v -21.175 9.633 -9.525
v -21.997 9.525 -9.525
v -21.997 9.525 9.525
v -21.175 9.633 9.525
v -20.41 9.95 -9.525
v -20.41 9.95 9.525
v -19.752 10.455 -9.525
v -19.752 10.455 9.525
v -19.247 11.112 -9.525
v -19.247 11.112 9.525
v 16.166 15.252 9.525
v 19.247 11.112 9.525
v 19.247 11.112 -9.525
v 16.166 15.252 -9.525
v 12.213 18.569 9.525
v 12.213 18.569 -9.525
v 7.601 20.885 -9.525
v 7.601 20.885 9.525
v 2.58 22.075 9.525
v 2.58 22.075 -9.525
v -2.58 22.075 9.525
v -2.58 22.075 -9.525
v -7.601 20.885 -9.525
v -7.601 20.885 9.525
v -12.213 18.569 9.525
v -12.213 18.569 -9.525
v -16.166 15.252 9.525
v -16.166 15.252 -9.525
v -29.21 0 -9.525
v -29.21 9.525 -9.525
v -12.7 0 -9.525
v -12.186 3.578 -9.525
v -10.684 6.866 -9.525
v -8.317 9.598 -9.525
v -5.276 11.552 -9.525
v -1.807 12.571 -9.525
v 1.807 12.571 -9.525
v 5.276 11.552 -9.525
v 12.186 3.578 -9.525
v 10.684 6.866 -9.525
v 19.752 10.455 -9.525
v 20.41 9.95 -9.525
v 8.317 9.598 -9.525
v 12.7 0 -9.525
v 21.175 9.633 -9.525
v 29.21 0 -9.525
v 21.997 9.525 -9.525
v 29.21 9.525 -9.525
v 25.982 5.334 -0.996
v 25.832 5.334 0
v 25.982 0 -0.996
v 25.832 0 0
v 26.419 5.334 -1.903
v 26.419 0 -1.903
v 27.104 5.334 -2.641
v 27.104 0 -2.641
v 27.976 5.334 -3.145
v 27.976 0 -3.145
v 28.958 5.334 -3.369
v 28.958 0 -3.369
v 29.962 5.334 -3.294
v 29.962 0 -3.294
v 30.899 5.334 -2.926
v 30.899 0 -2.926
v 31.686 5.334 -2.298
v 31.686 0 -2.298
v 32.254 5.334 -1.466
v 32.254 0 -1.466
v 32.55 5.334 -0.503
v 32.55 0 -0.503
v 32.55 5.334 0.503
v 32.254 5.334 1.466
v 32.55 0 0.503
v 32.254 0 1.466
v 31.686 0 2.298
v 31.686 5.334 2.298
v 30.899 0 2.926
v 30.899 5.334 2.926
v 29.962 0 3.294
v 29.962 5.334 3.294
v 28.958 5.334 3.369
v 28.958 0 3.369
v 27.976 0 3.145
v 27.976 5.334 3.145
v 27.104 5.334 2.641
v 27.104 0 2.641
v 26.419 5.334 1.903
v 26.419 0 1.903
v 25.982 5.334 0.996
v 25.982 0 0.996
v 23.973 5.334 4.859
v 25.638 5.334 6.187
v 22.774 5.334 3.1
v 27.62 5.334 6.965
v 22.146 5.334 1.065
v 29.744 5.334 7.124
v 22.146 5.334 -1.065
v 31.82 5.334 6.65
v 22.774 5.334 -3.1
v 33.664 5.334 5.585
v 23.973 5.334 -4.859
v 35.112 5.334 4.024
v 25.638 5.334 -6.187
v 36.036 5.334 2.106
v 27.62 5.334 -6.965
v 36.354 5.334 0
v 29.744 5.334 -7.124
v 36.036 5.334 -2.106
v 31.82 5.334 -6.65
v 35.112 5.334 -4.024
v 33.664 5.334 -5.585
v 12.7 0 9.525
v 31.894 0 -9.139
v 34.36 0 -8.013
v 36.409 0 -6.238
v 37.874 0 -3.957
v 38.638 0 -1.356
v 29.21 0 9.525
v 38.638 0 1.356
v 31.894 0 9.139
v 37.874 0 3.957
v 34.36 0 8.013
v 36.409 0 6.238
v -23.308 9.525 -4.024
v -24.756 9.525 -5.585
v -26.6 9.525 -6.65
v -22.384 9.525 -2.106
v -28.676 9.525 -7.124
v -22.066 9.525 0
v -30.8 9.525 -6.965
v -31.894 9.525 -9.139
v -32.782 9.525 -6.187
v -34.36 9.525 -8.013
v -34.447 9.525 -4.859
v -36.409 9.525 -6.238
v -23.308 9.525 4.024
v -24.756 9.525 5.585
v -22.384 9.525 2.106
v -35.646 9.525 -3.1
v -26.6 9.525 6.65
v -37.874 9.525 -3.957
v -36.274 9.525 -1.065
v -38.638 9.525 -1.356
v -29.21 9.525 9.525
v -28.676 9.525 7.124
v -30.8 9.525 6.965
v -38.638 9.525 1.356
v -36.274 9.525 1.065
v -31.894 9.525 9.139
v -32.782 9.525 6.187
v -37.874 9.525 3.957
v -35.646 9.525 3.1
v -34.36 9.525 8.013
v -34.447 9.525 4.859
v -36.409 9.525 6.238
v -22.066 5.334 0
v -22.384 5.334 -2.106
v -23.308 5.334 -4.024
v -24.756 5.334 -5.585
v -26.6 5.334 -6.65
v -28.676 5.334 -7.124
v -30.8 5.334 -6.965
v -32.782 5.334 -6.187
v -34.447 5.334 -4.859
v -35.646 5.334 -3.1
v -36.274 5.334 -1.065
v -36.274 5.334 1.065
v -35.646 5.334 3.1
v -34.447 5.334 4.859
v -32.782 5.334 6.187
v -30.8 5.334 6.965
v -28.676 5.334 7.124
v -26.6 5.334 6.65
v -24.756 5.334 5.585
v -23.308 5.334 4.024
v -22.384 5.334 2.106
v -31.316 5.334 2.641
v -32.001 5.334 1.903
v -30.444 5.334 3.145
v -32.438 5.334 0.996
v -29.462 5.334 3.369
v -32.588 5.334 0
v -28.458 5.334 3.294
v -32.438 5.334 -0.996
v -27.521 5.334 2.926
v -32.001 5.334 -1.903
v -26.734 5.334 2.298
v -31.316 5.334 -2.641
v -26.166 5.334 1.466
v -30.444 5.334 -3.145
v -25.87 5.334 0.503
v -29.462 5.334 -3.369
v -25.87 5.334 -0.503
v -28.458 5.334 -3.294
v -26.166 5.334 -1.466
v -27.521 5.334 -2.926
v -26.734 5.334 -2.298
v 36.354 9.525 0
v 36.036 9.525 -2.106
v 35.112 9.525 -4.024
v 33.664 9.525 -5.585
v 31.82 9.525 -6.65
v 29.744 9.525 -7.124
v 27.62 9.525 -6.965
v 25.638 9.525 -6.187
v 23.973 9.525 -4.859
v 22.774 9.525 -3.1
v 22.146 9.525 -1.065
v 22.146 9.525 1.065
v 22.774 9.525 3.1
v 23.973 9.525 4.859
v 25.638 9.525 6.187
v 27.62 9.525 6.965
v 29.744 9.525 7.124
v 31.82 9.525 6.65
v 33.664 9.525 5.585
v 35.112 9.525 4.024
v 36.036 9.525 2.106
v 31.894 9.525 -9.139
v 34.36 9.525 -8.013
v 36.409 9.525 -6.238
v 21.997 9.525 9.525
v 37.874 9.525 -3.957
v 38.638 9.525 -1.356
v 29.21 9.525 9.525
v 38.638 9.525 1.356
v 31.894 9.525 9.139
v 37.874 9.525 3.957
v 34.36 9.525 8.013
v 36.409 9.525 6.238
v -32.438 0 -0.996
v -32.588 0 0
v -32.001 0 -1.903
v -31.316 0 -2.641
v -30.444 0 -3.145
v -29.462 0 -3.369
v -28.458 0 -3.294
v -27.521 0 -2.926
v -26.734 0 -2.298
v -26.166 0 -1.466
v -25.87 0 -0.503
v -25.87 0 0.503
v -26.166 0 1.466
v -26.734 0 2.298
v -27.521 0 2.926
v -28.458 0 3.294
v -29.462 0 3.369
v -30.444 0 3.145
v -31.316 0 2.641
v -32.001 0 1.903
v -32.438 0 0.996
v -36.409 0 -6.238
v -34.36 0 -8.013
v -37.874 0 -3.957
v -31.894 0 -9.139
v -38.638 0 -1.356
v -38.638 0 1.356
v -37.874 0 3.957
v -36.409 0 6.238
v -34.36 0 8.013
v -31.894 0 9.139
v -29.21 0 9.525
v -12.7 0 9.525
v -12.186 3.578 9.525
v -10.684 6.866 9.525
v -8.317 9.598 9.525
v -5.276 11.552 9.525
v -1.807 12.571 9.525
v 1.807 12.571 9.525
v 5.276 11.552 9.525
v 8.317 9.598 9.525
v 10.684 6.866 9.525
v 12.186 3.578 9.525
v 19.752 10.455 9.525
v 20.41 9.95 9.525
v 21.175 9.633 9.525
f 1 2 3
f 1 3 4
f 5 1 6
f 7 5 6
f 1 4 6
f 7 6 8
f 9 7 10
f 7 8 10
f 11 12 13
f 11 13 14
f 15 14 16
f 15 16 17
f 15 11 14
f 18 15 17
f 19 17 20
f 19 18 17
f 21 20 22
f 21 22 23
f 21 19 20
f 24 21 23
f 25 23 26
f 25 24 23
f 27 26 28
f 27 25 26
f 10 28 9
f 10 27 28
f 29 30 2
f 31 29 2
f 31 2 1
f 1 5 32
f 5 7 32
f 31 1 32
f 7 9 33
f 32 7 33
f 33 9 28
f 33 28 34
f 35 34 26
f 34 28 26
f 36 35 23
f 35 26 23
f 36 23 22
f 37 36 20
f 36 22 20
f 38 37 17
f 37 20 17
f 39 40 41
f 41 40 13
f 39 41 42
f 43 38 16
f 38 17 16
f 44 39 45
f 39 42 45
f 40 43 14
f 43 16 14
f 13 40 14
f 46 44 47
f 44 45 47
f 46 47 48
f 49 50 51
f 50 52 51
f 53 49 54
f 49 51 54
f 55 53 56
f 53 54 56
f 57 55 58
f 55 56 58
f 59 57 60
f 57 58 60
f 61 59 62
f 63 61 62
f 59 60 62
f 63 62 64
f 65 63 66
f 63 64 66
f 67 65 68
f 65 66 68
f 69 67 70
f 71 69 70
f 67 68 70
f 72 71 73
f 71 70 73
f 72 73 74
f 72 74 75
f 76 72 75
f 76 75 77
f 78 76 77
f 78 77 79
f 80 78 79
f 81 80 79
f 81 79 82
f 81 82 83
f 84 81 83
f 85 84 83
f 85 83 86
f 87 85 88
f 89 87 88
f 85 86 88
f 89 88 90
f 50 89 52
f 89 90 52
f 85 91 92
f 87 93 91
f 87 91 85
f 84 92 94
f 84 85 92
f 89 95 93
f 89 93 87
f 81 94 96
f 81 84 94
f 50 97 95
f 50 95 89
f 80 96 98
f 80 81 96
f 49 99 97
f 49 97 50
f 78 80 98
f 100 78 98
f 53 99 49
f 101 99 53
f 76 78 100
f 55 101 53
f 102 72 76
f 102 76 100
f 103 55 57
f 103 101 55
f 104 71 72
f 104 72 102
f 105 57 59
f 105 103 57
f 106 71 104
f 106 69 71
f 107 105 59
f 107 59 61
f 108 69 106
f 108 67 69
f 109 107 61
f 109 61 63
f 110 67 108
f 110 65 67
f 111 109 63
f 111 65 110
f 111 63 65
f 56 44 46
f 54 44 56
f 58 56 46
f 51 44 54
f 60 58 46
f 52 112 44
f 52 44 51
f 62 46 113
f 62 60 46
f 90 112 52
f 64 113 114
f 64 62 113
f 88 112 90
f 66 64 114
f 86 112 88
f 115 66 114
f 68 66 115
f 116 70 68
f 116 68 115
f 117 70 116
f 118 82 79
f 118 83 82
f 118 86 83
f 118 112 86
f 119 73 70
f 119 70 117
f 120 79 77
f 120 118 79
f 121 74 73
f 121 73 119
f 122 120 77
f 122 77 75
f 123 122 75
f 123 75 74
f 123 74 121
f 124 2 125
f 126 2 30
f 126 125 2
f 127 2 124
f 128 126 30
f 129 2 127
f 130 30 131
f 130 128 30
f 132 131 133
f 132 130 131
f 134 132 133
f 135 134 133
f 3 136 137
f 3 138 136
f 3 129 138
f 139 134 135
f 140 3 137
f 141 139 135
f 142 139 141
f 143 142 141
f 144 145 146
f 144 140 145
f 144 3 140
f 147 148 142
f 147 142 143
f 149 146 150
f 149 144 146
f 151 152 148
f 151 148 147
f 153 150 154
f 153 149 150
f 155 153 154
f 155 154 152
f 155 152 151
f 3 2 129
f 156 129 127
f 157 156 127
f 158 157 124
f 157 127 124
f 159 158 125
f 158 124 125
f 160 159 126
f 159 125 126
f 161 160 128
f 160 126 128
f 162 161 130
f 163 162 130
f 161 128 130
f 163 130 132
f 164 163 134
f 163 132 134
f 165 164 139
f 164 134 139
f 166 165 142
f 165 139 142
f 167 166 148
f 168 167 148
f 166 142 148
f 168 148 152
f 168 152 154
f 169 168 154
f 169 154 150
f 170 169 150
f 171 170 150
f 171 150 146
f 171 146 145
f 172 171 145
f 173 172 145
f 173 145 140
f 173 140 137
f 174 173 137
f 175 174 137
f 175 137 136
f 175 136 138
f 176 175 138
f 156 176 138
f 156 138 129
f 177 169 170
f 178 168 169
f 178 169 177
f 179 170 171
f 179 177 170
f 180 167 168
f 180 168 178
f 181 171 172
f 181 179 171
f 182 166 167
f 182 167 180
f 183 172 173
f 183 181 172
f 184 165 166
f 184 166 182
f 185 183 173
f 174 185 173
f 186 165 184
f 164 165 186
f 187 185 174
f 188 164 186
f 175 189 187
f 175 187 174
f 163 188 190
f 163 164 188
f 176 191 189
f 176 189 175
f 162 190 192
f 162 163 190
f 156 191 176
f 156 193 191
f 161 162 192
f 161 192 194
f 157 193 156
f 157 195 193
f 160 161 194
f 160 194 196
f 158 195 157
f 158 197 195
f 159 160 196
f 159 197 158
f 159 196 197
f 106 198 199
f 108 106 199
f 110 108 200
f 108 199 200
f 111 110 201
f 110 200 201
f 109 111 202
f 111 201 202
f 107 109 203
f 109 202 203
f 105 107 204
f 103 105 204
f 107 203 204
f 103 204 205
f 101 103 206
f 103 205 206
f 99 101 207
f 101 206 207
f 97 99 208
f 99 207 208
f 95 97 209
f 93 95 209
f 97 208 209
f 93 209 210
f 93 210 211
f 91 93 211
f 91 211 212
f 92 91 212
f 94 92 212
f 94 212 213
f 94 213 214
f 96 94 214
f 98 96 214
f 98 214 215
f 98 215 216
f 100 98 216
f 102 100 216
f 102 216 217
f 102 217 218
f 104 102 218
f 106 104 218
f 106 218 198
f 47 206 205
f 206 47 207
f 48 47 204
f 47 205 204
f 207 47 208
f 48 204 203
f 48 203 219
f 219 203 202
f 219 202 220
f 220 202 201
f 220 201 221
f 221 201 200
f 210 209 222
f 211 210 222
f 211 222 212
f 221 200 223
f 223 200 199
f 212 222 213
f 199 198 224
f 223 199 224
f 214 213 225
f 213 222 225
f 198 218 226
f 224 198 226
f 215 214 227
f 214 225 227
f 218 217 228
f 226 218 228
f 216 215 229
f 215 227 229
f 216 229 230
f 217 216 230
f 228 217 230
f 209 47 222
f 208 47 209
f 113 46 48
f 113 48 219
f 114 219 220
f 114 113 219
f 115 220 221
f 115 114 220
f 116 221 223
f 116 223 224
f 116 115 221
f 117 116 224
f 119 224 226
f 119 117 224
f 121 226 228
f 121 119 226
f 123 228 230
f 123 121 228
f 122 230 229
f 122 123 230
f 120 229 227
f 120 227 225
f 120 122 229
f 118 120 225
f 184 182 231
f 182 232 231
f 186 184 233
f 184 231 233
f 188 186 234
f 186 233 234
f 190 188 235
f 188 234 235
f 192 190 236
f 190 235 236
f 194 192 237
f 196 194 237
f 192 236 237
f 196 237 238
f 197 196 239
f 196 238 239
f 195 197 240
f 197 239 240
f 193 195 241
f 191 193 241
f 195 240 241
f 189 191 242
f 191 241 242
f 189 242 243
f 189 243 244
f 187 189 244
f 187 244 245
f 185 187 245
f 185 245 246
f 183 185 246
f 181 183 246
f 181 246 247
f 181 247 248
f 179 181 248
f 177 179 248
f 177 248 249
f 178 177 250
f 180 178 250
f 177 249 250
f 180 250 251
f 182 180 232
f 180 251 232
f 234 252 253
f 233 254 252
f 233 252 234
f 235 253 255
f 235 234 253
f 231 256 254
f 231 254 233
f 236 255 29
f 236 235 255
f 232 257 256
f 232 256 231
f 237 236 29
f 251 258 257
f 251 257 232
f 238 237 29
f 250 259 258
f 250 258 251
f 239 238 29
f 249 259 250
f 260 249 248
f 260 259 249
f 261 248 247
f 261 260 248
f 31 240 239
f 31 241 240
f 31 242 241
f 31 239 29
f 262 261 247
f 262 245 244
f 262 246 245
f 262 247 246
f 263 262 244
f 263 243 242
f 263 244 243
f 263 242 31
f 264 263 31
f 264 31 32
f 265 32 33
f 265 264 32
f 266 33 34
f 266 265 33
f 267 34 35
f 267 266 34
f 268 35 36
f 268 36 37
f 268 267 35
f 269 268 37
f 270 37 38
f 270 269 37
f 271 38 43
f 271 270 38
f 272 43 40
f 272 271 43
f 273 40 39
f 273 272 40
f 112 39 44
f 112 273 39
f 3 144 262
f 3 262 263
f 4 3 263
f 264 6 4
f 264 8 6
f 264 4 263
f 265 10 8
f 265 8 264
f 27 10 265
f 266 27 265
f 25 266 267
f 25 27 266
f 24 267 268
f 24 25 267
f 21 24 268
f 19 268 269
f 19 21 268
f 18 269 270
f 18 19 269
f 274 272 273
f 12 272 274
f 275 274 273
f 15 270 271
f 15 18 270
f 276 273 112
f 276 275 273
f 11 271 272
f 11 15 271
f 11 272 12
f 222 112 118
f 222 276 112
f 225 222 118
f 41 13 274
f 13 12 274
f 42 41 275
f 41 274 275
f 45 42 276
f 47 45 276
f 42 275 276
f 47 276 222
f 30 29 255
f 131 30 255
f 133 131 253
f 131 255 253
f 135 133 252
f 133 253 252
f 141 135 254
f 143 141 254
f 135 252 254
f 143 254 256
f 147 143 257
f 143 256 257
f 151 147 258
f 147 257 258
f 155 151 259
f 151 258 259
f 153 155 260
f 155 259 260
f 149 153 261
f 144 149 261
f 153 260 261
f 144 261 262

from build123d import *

# Parameters (mm, degrees)
BOSS_EXTRUDE1_DEPTH                                  = 9.525
BOSS_EXTRUDE2_DEPTH                                  = 9.525
FILLET1_R                                            = 3.175
CBORE_FOR_1_4_BINDING_HEAD_MACHINE_SCREW_D           = 6.7564
CBORE_FOR_1_4_BINDING_HEAD_MACHINE_SCREW_CBORE_D     = 14.2875
CBORE_FOR_1_4_BINDING_HEAD_MACHINE_SCREW_CBORE_DEPTH = 4.191


with BuildPart() as part:
    # Sketch1 → Boss-Extrude1 (new, symmetric)
    with BuildSketch(Plane.XY):
        with BuildLine():
            Line((-22.225, 0), (-12.7, 0))
            ThreePointArc((-12.7, 0), (0, 12.7), (12.7, 0))
            Line((12.7, 0), (22.225, 0))
            ThreePointArc((22.225, 0), (0, 22.225), (-22.225, 0))
        make_face()
    extrude(amount=BOSS_EXTRUDE1_DEPTH, both=True)

    # Sketch2 → Boss-Extrude2 (add)
    with BuildSketch(Plane.XZ):
        with BuildLine():
            Line((-12.7, -9.525), (-29.21, -9.525))
            ThreePointArc((-29.21, -9.525), (-38.735, 0), (-29.21, 9.525))
            Line((-29.21, 9.525), (-12.7, 9.525))
            Line((-12.7, 9.525), (-12.7, -9.525))
        make_face()
        with BuildLine():
            Line((12.7, 9.525), (12.7, -9.525))
            Line((12.7, -9.525), (29.21, -9.525))
            ThreePointArc((29.21, -9.525), (38.735, 0), (29.21, 9.525))
            Line((29.21, 9.525), (12.7, 9.525))
        make_face()
    extrude(amount=-BOSS_EXTRUDE2_DEPTH)

    # Fillet1
    fillet1_edges = [part.edges().sort_by_distance(p)[0] for p in [
        (-20.080463142, 9.525, 0),
        (20.080463142, 9.525, 0),
    ]]
    fillet(fillet1_edges, radius=FILLET1_R)

    # CBORE for 1/4 Binding Head Machine Screw1 (through all)
    with Locations(Plane(origin=(0, 9.525, 0), x_dir=(1, 0, 0), z_dir=(0, 1, 0))):
        with Locations((-29.21, 0), (29.21, 0)):
            CounterBoreHole(CBORE_FOR_1_4_BINDING_HEAD_MACHINE_SCREW_D / 2, CBORE_FOR_1_4_BINDING_HEAD_MACHINE_SCREW_CBORE_D / 2, CBORE_FOR_1_4_BINDING_HEAD_MACHINE_SCREW_CBORE_DEPTH)


solid = part.part
